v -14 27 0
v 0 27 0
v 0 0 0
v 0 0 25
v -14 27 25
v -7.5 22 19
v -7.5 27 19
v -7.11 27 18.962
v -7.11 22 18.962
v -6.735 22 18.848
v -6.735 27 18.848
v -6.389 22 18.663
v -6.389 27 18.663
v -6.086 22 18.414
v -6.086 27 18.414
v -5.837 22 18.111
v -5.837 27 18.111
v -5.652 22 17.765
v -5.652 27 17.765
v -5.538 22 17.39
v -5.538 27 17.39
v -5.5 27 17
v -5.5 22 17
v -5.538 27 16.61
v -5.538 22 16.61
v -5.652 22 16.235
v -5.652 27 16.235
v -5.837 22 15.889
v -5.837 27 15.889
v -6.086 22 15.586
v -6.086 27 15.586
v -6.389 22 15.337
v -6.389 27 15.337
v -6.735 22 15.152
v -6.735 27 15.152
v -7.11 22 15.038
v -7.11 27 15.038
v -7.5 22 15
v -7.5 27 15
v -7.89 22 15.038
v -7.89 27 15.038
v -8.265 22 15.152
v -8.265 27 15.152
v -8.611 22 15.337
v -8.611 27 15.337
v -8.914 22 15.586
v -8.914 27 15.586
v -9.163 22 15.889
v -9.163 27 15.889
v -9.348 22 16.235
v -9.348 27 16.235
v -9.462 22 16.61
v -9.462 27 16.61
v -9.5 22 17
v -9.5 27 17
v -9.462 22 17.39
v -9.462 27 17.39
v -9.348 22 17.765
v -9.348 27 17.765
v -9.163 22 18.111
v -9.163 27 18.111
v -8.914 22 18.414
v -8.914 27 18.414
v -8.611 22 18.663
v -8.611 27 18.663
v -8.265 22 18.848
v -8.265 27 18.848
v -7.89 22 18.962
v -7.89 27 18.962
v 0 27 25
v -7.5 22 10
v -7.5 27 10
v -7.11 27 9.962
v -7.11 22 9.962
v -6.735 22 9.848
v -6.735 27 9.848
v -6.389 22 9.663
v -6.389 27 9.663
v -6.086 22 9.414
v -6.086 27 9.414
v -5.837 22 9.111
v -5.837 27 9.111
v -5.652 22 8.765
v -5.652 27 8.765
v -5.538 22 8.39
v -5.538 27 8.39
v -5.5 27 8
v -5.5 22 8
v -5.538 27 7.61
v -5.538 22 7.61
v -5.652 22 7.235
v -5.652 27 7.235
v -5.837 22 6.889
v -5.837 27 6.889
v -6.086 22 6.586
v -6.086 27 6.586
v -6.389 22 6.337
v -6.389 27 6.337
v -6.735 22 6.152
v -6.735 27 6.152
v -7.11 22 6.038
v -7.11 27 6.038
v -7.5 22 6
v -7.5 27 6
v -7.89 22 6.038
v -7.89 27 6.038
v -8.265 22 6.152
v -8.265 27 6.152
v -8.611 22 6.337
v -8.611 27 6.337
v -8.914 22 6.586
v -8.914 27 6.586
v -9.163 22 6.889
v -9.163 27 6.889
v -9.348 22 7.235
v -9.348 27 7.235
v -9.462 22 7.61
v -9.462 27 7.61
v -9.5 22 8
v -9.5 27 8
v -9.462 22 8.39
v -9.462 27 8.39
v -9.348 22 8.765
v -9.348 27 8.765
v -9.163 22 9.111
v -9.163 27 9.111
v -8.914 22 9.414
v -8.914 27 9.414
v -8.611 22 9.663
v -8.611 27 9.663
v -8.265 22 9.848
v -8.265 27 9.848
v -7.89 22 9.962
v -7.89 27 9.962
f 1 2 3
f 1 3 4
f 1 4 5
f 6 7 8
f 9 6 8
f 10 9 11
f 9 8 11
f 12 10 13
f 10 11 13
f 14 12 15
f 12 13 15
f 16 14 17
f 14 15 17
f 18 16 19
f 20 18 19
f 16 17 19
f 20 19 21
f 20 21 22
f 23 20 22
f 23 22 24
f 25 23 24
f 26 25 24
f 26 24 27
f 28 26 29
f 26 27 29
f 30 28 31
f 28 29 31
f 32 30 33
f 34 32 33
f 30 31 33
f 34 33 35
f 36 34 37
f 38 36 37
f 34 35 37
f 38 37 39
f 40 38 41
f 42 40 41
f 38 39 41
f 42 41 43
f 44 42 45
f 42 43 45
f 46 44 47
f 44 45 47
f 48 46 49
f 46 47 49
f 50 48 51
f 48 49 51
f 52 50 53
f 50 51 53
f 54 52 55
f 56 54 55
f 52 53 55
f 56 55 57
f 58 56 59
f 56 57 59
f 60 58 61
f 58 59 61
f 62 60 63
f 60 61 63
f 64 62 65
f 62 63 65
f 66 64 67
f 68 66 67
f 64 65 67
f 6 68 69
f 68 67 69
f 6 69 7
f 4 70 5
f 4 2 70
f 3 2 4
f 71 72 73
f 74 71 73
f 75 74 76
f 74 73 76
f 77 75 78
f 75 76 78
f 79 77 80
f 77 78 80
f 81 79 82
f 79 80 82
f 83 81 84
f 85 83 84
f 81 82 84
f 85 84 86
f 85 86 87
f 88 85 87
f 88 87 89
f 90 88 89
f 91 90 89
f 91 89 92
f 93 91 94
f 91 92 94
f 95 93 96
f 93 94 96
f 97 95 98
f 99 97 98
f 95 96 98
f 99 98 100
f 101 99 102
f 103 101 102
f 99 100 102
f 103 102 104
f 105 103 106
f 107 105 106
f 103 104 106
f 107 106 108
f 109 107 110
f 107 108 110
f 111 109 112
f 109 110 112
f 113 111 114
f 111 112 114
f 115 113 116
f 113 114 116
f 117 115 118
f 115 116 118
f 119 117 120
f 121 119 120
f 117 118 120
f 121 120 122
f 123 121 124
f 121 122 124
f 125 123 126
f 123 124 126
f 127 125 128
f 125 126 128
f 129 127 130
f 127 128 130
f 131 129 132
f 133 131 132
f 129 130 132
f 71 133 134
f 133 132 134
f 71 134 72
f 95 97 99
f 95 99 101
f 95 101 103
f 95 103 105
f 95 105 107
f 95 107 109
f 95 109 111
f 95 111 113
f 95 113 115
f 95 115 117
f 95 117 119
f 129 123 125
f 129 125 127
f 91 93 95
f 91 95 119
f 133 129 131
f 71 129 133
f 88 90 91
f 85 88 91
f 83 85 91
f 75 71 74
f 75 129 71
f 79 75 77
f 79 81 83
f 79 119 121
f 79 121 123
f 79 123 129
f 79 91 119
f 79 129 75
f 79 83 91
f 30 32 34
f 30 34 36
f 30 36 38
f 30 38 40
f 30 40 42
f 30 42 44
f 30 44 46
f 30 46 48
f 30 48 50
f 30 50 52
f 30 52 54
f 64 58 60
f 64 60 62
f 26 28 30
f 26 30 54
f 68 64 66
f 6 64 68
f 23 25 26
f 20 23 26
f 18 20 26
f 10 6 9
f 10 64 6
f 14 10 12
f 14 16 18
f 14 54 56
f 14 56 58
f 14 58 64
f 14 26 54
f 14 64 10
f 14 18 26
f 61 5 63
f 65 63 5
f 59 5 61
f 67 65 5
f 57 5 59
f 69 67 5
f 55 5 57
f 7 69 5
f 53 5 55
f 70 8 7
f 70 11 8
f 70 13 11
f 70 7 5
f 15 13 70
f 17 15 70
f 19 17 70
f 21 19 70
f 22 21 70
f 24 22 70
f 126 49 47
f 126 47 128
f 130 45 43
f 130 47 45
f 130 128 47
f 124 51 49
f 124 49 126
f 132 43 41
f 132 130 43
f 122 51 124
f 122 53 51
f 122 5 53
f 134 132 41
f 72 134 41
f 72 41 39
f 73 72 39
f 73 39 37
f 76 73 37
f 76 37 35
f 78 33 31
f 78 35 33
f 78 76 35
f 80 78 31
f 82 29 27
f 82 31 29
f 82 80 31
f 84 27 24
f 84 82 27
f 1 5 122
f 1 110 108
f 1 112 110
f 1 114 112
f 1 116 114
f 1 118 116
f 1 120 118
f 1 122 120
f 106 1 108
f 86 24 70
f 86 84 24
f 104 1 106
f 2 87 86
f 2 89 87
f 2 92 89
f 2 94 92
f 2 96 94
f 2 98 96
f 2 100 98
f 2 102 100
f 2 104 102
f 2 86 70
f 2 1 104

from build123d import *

# Parameters (mm, degrees)
BOSS_EXTRUDE1_DEPTH = 25
SKETCH2_R           = 2
CUT_EXTRUDE1_DEPTH  = 5


with BuildPart() as part:
    # Sketch1 → Boss-Extrude1 (new body)
    with BuildSketch(Plane.XY):
        Polygon((0, 0), (-14, 27), (0, 27), align=None)
    extrude(amount=BOSS_EXTRUDE1_DEPTH)

    # Sketch2 → Cut-Extrude1 (cut)
    with BuildSketch(Plane(origin=(0, 27, 0), x_dir=(1, 0, 0), z_dir=(0, 1, 0))):
        with Locations(Location((-7.5, -8, 0), (0, 0, 270))):
            Circle(SKETCH2_R)
        with Locations(Location((-7.5, -17, 0), (0, 0, 270))):
            Circle(SKETCH2_R)
    extrude(amount=-CUT_EXTRUDE1_DEPTH, mode=Mode.SUBTRACT)


solid = part.part
